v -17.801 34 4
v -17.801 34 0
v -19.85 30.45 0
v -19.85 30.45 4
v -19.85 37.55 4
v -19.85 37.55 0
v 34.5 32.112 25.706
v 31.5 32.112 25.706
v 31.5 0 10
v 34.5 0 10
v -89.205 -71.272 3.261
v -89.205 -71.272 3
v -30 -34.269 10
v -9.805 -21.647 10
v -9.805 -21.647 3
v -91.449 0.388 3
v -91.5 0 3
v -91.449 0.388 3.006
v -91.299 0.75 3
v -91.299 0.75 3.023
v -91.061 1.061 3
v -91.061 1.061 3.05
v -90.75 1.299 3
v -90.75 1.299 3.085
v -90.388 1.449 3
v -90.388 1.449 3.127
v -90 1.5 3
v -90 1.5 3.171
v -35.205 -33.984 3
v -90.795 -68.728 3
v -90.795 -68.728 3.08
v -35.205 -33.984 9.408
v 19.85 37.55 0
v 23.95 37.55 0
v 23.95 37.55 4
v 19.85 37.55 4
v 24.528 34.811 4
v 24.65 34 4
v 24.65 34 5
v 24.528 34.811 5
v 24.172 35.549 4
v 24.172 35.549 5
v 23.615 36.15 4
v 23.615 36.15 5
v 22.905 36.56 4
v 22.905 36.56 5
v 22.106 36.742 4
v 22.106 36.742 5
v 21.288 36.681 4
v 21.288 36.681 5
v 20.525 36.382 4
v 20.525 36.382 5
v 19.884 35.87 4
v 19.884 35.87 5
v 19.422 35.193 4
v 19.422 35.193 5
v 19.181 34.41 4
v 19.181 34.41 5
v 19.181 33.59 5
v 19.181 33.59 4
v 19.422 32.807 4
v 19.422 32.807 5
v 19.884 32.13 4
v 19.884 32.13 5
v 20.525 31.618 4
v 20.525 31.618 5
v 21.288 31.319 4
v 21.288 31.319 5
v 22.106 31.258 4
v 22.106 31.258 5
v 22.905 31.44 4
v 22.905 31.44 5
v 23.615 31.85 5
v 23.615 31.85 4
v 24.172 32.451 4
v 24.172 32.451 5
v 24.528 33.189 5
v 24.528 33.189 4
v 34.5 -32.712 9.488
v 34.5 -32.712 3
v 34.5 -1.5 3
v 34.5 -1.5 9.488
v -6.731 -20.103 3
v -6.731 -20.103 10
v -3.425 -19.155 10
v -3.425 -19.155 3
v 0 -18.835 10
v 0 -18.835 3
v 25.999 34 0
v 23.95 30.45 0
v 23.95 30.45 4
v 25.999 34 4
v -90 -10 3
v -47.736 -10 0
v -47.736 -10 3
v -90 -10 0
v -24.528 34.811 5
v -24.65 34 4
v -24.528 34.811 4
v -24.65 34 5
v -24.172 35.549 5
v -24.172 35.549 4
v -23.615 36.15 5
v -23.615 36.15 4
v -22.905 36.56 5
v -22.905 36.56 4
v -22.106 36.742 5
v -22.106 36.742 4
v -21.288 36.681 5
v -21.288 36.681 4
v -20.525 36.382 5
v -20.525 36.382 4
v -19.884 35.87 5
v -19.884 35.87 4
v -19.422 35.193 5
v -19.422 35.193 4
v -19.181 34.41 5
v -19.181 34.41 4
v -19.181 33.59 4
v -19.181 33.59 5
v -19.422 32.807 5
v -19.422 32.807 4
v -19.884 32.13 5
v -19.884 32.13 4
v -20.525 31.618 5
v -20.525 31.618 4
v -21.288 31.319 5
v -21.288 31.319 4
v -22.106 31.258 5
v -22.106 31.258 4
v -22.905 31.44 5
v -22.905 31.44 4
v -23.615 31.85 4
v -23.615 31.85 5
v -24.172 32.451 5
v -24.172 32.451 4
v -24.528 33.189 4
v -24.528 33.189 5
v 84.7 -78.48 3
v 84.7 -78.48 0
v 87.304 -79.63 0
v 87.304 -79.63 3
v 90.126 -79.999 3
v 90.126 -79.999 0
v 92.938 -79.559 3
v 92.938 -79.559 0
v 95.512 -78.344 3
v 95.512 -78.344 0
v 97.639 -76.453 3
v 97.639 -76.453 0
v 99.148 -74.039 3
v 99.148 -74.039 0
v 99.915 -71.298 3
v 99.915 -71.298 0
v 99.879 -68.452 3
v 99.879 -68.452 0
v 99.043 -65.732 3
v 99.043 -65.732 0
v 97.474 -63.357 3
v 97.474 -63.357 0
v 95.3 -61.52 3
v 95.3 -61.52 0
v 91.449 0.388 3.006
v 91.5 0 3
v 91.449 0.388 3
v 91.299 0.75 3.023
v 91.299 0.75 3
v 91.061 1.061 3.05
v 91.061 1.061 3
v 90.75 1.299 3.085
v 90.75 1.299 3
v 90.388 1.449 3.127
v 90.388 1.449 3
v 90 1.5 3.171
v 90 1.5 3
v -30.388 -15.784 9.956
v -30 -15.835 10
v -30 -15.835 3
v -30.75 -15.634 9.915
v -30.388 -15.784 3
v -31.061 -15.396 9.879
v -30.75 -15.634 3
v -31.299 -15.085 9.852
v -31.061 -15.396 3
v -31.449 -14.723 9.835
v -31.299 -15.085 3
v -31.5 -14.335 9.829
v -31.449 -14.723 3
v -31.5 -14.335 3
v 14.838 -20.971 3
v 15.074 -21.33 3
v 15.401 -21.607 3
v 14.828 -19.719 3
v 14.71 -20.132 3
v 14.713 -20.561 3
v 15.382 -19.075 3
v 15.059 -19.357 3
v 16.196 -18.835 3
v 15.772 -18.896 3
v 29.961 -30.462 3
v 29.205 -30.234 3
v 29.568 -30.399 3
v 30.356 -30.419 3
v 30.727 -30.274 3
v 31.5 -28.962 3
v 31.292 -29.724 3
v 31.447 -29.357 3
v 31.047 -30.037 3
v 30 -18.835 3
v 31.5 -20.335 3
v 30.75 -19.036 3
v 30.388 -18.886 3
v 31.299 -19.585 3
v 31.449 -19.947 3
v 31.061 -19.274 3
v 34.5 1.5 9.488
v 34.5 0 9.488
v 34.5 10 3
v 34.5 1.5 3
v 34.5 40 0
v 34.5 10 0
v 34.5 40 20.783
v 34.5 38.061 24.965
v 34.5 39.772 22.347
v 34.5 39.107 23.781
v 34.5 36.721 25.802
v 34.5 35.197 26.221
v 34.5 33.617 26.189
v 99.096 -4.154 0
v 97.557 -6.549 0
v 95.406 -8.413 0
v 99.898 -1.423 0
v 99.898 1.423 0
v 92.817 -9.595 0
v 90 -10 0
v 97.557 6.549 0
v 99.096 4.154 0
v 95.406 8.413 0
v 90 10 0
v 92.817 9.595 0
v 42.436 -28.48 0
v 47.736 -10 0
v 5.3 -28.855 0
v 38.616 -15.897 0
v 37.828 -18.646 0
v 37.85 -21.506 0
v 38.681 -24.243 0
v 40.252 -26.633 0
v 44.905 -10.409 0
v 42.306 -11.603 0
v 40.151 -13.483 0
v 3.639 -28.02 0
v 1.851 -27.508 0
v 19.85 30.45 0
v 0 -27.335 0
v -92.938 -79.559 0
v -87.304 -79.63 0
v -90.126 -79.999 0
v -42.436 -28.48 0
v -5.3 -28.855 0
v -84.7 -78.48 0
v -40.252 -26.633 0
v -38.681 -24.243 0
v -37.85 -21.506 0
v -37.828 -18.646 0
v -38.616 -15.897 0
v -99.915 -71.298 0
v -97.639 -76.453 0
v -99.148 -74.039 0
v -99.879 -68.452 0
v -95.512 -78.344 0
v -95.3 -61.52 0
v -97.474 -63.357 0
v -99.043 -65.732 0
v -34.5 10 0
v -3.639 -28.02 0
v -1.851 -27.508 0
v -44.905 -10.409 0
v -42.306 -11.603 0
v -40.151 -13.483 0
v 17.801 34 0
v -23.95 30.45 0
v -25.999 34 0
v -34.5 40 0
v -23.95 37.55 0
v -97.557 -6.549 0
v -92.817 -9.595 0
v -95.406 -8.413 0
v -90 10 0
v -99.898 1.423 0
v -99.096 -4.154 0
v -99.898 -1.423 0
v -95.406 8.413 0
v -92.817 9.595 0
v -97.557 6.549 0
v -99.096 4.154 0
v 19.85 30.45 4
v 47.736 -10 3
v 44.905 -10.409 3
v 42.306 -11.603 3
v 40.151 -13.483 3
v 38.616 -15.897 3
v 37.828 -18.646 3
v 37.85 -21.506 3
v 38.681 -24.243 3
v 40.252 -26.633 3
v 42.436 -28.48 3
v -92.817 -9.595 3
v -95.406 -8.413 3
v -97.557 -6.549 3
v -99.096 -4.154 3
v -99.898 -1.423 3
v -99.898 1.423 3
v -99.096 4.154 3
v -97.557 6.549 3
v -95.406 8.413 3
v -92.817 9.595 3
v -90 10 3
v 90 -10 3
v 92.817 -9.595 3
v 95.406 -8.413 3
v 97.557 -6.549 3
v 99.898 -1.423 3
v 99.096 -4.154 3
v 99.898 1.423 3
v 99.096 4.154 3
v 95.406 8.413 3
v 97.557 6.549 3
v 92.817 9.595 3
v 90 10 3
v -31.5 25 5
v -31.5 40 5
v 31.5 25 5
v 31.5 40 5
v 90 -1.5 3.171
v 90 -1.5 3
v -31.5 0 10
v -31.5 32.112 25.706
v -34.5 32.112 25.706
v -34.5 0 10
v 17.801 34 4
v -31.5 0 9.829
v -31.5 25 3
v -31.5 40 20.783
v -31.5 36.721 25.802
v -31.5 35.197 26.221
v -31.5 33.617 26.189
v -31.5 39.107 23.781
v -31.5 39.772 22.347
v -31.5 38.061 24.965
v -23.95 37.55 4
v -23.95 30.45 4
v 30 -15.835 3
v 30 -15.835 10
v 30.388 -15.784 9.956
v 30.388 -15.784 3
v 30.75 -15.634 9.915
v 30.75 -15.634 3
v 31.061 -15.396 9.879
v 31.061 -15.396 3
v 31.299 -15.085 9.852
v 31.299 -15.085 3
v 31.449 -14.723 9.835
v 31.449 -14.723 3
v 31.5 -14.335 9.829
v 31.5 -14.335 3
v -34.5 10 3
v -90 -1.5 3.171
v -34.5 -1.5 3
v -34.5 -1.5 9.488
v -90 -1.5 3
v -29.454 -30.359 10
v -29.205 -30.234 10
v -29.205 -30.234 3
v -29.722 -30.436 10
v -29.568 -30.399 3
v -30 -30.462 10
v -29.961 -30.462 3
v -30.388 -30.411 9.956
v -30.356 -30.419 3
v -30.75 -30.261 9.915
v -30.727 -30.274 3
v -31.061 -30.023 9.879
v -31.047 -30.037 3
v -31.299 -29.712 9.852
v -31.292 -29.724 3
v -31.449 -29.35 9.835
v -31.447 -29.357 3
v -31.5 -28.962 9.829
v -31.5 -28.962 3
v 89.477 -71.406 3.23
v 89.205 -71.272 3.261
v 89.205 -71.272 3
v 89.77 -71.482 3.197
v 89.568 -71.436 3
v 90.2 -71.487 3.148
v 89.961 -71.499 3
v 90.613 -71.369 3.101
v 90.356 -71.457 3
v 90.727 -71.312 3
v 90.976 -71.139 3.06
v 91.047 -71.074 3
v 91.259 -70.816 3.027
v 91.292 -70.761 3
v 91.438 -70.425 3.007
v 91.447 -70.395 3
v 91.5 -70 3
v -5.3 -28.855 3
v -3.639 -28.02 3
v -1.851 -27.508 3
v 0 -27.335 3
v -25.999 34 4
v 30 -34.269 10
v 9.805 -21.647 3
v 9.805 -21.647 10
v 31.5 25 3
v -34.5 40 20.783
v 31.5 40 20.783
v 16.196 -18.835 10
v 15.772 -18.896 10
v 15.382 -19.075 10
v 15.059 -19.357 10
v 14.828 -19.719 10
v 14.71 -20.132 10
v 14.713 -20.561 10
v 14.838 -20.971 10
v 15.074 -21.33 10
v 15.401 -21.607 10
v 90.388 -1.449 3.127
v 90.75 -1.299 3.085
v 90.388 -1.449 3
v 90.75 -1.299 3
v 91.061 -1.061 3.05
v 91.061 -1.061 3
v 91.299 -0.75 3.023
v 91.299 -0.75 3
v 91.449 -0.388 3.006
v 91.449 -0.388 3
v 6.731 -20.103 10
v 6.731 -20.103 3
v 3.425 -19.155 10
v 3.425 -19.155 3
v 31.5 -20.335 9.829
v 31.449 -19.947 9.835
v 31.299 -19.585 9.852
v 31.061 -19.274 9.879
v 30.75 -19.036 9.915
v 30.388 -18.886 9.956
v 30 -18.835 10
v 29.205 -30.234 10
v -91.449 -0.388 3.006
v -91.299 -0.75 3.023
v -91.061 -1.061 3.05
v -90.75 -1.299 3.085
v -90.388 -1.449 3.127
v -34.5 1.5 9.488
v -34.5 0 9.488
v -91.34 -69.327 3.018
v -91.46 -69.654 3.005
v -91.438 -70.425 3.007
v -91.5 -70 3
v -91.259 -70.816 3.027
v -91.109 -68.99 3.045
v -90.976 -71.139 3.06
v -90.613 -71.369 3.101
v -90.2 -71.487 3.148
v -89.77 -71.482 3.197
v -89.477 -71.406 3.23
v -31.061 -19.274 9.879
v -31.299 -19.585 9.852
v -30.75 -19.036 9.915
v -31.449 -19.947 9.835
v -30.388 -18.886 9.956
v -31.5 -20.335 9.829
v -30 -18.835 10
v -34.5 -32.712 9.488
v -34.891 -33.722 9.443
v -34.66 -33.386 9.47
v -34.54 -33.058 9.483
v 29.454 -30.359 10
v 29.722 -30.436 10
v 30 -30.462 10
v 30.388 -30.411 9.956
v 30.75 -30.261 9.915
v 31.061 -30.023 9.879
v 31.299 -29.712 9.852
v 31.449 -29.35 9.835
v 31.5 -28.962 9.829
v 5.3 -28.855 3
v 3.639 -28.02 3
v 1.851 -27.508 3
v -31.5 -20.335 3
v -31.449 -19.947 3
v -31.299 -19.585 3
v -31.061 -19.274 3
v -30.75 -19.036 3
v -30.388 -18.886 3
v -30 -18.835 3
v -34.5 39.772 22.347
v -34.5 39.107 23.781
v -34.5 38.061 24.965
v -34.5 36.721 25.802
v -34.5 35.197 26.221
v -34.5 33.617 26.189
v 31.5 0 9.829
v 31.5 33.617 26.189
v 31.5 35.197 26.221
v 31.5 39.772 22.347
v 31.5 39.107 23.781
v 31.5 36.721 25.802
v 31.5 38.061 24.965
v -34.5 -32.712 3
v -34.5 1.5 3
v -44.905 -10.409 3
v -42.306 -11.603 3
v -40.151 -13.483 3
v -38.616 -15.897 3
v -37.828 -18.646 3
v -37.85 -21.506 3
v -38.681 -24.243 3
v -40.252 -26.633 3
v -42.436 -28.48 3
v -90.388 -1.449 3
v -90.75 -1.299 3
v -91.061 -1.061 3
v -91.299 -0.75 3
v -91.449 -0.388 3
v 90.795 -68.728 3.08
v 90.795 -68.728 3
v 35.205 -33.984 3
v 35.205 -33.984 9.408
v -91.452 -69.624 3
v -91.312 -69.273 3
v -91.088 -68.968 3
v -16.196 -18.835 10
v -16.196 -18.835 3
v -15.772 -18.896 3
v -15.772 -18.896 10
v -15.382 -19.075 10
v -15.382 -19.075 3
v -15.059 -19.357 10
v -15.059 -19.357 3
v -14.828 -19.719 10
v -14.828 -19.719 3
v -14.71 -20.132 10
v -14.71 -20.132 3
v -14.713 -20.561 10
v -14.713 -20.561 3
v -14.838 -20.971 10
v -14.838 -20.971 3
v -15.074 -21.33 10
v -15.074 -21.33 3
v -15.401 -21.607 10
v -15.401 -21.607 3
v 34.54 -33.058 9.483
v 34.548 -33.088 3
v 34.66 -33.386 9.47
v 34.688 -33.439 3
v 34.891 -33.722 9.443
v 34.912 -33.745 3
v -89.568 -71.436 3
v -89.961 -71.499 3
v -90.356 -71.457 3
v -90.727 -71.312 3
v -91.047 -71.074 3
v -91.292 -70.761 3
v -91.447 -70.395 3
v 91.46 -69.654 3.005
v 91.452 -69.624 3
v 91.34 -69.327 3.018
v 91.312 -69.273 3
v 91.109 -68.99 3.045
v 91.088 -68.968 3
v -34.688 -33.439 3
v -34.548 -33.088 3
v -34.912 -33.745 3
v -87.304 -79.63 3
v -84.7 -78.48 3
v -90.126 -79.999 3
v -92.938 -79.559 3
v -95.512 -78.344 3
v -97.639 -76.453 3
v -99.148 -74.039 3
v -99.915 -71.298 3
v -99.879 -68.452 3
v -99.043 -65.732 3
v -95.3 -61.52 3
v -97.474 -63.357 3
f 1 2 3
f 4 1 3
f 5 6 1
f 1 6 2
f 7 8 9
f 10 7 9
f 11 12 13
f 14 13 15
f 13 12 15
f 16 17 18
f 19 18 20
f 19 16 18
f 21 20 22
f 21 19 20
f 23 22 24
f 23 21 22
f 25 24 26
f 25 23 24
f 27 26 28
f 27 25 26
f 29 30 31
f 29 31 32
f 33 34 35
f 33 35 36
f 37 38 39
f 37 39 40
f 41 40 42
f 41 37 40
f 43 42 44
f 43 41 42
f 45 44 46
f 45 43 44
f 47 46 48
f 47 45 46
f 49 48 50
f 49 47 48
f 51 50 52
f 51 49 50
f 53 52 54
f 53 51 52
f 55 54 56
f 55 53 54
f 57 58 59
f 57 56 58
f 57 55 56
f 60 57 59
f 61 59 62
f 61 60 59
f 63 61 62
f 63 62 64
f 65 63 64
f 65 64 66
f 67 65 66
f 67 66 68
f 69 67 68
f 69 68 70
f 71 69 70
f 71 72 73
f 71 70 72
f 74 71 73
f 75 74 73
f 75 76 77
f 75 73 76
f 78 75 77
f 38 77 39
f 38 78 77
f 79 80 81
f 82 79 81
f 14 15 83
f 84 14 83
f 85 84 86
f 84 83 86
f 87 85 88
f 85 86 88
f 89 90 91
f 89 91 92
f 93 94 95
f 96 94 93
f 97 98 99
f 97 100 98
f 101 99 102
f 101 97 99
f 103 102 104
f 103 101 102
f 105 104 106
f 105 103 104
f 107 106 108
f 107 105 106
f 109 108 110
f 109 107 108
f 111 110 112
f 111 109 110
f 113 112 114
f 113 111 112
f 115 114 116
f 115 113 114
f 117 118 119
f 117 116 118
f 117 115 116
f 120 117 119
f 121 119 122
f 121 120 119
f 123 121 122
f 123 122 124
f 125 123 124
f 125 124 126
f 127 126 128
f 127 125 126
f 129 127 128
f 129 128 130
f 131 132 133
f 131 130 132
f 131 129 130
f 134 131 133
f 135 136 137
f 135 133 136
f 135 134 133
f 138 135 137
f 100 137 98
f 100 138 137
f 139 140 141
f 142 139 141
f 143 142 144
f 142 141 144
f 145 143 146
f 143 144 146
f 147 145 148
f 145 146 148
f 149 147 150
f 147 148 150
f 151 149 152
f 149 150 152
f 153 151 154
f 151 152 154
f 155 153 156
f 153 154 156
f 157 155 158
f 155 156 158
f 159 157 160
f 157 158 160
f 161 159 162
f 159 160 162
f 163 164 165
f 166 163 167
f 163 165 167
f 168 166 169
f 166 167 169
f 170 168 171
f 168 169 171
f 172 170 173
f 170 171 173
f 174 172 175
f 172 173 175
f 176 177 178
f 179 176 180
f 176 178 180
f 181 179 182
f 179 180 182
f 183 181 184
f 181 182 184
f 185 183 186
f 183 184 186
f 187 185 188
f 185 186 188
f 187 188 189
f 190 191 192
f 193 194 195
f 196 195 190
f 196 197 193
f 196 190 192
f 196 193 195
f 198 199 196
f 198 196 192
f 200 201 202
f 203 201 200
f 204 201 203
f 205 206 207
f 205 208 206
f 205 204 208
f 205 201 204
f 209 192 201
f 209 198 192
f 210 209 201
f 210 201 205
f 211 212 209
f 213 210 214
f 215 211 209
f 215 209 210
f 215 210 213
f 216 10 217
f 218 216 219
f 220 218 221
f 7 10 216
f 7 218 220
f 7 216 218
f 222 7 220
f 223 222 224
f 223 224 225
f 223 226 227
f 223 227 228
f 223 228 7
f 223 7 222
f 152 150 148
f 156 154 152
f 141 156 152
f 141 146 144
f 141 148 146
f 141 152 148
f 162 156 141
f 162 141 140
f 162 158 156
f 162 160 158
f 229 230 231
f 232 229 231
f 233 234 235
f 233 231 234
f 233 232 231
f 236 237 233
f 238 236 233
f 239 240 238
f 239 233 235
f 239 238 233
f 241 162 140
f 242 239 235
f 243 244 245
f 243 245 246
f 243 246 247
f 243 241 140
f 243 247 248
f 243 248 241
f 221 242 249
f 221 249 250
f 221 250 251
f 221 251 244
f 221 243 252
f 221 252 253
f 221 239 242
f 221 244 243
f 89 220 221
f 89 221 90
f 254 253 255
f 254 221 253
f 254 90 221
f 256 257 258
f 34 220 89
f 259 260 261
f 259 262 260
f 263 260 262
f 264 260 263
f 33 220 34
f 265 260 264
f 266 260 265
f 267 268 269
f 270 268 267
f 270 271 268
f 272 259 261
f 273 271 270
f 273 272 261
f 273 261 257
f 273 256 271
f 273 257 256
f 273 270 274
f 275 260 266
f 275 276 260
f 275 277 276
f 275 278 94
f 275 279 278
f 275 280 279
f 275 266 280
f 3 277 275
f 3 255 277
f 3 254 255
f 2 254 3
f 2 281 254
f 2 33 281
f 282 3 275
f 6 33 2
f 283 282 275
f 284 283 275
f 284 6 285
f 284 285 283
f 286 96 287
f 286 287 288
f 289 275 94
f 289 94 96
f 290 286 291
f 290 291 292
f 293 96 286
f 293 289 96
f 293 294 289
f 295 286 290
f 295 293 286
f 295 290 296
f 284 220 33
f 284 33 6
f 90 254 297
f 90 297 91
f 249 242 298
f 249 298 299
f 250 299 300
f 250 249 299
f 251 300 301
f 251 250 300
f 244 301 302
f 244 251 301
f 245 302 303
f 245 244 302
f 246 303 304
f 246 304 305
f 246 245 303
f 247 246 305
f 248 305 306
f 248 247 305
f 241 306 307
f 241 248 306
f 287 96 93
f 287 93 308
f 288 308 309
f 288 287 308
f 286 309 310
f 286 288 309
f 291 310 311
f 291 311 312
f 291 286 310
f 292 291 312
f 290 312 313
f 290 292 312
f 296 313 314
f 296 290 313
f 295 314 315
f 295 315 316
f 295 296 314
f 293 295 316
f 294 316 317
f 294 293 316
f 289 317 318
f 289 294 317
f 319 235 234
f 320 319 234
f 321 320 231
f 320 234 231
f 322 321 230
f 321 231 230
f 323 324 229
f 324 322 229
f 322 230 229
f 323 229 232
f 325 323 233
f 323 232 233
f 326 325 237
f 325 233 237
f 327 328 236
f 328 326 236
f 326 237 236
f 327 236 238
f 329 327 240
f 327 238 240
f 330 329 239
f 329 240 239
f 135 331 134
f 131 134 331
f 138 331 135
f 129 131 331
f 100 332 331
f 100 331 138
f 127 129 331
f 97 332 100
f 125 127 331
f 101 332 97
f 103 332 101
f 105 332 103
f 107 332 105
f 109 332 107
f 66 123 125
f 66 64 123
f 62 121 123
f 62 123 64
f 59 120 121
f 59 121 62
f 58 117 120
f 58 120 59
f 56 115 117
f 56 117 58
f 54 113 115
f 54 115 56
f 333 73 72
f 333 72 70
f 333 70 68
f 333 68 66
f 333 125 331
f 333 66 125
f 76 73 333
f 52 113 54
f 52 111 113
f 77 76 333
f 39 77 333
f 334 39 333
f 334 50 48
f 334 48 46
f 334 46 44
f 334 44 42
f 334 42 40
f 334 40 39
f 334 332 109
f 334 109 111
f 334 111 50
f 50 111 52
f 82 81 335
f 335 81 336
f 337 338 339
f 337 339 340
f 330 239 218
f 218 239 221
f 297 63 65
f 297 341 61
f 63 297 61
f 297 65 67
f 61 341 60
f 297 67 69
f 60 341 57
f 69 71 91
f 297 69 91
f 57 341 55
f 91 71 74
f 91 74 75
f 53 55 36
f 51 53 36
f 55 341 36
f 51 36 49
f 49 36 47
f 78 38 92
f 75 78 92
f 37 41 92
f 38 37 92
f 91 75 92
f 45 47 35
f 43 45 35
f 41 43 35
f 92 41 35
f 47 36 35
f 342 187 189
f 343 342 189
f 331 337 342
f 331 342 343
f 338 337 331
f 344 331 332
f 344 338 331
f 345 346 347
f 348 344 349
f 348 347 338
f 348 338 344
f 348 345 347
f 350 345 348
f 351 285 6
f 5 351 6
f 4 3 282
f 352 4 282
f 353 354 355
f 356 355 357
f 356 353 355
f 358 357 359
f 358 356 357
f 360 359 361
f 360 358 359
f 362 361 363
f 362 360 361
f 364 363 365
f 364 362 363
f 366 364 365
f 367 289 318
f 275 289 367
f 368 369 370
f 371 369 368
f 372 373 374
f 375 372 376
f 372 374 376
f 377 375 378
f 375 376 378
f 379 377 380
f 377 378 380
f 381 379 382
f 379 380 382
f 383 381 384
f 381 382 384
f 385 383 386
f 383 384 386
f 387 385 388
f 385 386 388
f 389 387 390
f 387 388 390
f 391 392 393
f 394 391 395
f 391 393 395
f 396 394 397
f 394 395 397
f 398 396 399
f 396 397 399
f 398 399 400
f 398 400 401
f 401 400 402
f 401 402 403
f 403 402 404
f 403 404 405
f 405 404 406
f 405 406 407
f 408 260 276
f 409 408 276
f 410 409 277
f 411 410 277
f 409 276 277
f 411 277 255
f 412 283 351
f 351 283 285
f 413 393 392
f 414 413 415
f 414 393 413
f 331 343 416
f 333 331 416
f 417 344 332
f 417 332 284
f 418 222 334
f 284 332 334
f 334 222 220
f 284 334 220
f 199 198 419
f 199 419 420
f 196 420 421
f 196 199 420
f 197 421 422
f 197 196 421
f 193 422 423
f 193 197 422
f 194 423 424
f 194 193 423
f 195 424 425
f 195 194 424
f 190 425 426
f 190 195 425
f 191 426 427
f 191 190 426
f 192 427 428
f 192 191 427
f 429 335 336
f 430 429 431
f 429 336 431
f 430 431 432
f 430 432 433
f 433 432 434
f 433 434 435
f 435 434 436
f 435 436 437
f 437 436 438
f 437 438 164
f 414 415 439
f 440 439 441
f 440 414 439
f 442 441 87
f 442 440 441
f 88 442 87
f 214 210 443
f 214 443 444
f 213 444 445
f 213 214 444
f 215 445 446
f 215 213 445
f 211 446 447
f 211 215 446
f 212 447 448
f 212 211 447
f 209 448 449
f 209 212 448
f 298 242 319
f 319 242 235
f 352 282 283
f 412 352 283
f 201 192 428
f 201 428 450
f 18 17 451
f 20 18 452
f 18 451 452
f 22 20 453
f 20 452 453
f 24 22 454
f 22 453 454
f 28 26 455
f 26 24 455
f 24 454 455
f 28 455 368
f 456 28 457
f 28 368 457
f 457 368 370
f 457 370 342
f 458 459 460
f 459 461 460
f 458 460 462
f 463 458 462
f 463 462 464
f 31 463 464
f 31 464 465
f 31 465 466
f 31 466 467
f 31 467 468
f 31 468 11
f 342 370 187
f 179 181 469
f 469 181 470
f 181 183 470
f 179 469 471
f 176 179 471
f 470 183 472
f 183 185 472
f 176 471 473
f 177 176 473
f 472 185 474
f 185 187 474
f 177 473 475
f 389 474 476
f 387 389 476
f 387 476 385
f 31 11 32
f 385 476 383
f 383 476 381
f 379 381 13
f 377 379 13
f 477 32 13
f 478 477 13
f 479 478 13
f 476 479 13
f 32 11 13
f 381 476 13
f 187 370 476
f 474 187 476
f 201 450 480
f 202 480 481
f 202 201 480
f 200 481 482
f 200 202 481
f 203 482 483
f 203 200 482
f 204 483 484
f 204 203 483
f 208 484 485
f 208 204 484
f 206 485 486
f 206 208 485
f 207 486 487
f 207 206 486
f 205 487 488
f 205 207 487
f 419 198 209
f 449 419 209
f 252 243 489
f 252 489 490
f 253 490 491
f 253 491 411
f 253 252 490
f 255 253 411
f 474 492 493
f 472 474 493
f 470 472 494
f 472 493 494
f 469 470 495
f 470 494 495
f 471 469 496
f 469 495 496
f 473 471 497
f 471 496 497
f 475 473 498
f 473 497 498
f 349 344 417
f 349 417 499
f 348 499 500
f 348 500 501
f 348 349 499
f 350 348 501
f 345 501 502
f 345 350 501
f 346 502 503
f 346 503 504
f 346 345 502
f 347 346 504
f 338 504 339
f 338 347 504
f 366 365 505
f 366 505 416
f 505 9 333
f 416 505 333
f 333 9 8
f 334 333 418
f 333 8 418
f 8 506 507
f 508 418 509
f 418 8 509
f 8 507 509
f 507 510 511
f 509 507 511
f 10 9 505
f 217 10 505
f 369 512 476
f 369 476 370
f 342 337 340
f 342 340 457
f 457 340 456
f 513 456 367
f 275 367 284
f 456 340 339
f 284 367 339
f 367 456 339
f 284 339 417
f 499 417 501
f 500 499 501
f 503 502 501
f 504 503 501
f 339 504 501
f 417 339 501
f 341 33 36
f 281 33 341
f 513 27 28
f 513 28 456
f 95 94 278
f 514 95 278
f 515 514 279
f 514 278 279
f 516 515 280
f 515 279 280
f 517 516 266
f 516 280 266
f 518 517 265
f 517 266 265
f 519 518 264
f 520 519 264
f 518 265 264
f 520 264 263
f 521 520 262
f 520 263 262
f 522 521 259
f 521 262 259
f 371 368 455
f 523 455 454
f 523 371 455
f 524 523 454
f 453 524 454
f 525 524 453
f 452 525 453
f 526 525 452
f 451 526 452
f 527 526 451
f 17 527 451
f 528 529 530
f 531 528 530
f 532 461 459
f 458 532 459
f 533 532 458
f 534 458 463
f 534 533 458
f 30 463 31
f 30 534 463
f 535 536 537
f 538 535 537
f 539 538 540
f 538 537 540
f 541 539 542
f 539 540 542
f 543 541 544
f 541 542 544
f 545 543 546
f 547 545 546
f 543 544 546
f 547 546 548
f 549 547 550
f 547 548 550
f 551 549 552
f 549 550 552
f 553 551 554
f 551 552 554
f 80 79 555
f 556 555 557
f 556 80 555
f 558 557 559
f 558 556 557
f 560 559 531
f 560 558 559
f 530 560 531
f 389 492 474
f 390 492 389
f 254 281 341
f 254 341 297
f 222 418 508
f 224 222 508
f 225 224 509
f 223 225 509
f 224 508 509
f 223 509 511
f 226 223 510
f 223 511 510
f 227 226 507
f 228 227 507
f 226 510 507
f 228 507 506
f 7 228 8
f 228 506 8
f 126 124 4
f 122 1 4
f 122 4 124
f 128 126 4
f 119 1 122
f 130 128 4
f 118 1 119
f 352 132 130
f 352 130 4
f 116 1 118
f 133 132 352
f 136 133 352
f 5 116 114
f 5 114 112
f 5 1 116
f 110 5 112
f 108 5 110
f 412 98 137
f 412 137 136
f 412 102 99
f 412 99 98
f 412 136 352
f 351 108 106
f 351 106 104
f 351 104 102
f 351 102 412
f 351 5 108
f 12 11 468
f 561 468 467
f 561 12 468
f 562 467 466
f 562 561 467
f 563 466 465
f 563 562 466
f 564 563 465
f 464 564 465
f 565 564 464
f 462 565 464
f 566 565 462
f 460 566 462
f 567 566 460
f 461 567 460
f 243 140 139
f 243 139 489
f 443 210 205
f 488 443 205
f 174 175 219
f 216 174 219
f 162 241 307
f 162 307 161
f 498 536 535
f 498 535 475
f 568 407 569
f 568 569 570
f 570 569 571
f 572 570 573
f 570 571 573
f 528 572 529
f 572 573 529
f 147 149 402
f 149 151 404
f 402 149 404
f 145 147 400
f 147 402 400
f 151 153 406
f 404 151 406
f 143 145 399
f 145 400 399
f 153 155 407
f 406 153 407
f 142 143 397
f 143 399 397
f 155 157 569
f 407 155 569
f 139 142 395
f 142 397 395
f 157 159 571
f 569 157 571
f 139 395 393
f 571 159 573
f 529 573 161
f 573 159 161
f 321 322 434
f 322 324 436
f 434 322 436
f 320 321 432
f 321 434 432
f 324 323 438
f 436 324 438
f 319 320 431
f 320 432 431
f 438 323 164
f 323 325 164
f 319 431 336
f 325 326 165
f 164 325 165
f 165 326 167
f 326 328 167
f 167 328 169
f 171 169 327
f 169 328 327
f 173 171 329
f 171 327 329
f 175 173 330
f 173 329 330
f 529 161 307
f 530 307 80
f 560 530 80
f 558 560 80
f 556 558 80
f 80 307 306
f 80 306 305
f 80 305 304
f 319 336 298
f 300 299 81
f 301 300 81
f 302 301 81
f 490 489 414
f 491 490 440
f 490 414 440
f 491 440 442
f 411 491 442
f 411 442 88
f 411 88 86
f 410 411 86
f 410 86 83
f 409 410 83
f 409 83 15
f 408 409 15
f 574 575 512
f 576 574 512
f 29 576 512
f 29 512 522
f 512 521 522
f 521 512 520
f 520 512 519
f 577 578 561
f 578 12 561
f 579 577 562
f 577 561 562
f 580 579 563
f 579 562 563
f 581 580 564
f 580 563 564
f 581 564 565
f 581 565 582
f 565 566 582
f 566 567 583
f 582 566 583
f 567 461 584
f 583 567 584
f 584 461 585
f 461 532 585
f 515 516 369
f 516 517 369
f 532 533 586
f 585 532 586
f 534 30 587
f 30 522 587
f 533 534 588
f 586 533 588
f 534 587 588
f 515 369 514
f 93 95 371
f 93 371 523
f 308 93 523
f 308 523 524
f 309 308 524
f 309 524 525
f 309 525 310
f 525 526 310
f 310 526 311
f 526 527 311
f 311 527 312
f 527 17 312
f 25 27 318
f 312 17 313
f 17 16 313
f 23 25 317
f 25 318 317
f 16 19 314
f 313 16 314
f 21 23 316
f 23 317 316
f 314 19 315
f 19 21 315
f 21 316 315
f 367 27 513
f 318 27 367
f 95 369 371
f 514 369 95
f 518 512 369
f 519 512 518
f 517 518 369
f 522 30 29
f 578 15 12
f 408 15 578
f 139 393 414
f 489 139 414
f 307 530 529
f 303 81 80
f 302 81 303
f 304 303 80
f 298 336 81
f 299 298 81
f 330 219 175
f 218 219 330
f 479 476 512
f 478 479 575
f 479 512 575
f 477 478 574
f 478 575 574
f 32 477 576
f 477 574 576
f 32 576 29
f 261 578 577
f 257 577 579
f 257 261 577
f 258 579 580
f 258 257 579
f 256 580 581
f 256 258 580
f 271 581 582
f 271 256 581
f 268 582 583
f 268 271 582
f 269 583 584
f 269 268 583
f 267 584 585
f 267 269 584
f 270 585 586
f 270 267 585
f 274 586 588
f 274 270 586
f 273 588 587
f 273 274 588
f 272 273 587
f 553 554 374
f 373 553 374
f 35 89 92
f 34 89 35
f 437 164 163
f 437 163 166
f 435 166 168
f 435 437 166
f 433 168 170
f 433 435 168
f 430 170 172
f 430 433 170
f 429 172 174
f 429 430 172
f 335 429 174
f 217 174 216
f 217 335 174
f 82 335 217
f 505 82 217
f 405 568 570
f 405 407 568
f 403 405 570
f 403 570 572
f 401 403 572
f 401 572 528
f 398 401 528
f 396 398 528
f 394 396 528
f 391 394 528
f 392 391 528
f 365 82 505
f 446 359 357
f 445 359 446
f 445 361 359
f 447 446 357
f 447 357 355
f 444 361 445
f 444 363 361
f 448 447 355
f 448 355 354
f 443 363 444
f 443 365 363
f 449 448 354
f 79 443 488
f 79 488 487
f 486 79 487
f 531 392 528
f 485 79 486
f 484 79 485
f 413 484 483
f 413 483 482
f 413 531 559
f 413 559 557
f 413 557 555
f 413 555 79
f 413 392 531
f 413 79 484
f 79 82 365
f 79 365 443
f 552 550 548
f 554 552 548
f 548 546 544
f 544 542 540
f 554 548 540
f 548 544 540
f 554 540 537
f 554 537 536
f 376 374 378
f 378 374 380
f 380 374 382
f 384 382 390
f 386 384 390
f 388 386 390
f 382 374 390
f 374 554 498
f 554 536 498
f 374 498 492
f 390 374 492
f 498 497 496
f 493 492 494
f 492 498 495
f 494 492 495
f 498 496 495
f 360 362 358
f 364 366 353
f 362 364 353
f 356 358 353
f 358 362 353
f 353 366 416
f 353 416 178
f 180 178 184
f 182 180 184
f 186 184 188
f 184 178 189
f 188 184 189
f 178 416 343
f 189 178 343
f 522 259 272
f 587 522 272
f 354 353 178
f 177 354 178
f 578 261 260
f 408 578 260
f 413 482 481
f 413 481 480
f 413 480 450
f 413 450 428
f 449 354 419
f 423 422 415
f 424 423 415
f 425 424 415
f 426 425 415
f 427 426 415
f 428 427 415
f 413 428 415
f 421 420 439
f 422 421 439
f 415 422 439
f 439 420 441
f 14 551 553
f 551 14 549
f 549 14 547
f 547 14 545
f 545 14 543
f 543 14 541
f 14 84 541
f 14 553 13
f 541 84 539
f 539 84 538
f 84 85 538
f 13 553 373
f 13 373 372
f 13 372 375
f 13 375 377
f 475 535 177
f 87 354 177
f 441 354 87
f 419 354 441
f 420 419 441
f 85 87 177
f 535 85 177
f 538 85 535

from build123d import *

# Parameters (mm, degrees)
PAD_DEPTH            = 3
PAD001_DEPTH         = 10
SKETCH008_W          = 31.5
SKETCH008_H          = 15
PAD004_DEPTH         = 5
SKETCH009_R          = 2.75
POCKET002_DEPTH      = 313.05051685
POCKET002_DEPTH_BACK = 323.05051685
POCKET003_DEPTH      = 353.05051685
POCKET003_DEPTH_BACK = 393.05051685
POCKET004_DEPTH      = 4
PAD005_DEPTH         = 3


with BuildPart() as part:
    # Sketch → Pad (new body)
    with BuildSketch(Plane.XY):
        with BuildLine():
            ThreePointArc((89.9999996665, -10), (100, -1.98e-08), (89.9999997062, 10))
            Line((89.9999997062, 10), (31.5, 10))
            Line((31.5, 10), (31.5, 40))
            Line((31.5, 40), (0, 40))
            Line((0, 40), (0, 10))
            Line((0, 10), (0, -27.3349528301))
            ThreePointArc((5.3000111055, -28.854983356), (2.7568374325, -27.7224688967), (0, -27.3349528301))
            Line((84.6999795851, -78.4799636558), (5.3000111055, -28.854983356))
            ThreePointArc((84.6999795851, -78.4799636557), (98.4799840149, -75.2999878403), (95.2999552657, -61.5199956261))
            Line((42.4359754567, -28.4800082454), (95.2999552657, -61.5199956261))
            ThreePointArc((47.7359245737, -10), (38.1234305175, -17.2431977049), (42.4359754568, -28.4800082453))
            Line((47.7359245737, -10), (89.9999996665, -10))
        make_face()
    pad = extrude(amount=PAD_DEPTH)

    # Sketch001 → Pad001 (join)
    with BuildSketch(Plane.XY):
        with BuildLine():
            ThreePointArc((89.2050015192, -71.2719974118), (91.2719974827, -70.7949983672), (90.7949982537, -68.7280024463))
            Line((90.7949982537, -68.7280024463), (35.2050028881, -33.9842553428))
            ThreePointArc((34.5, -32.7122571332), (34.6880366632, -33.4394105688), (35.2050028881, -33.9842553428))
            Line((34.5, -32.7122571332), (34.5, -1.5))
            Line((34.5, -1.5), (89.9999999914, -1.5))
            ThreePointArc((89.9999999914, -1.5), (91.5, -1.09e-08), (90.0000000131, 1.5))
            Line((90.0000000131, 1.5), (34.5, 1.5))
            Line((34.5, 1.5), (34.5, 40))
            Line((34.5, 40), (31.5, 40))
            Line((31.5, 40), (31.5, -14.334953275))
            ThreePointArc((30.0000000301, -15.8349528301), (31.0606600252, -15.3956131485), (31.5, -14.334953275))
            Line((0, -15.8349528301), (30.0000000301, -15.8349528301))
            Line((0, -18.8349528301), (0, -15.8349528301))
            ThreePointArc((9.8049805408, -21.6469843002), (5.1001265767, -19.5518510506), (0, -18.8349528301))
            Line((89.2050015192, -71.2719974118), (9.8049805408, -21.6469843002))
        make_face()
        with BuildLine():
            Line((15.4013148944, -21.6069503467), (29.2050008044, -30.2342540405))
            ThreePointArc((29.2050008044, -30.2342540405), (30.727152292, -30.2742210781), (31.5, -28.9622573074))
            Line((31.5, -20.3349477146), (31.5, -28.9622573074))
            ThreePointArc((31.5, -20.3349477146), (31.0606583181, -19.2742908047), (29.9999998727, -18.8349528301))
            Line((16.1963133258, -18.8349528301), (29.9999998727, -18.8349528301))
            ThreePointArc((16.1963133258, -18.8349528301), (14.7544400888, -19.9214290586), (15.4013148944, -21.6069503467))
        make_face(mode=Mode.SUBTRACT)
    pad001 = extrude(amount=PAD001_DEPTH)

    # Sketch008 → Pad004 (join)
    with BuildSketch(Plane(origin=(0, 30, 0), x_dir=(1, 0, 0), z_dir=(0, 0, 1))):
        with Locations((15.75, 2.5)):
            Rectangle(SKETCH008_W, SKETCH008_H)
    pad004 = extrude(amount=PAD004_DEPTH)

    # Sketch009 → Pocket002 (cut, two sides)
    with BuildSketch(Plane(origin=(0, 30, 0), x_dir=(1, 0, 0), z_dir=(0, 0, 1))) as pocket002_sk:
        with Locations((21.9, 4)):
            Circle(SKETCH009_R)
    pocket002 = extrude(amount=-POCKET002_DEPTH, mode=Mode.SUBTRACT) + extrude(pocket002_sk.sketch, amount=POCKET002_DEPTH_BACK, mode=Mode.SUBTRACT)

    # Sketch010 → Pocket003 (cut, two sides)
    with BuildSketch(Plane.XZ) as pocket003_sk:
        Polygon((91.5, 3), (30, 10), (91.5, 10), align=None)
    pocket003 = extrude(amount=-POCKET003_DEPTH, mode=Mode.SUBTRACT) + extrude(pocket003_sk.sketch, amount=POCKET003_DEPTH_BACK, mode=Mode.SUBTRACT)

    # Sketch012 → Pocket004 (cut)
    with BuildSketch(Plane(origin=(0, 30, 0), x_dir=(1, 0, 0), z_dir=(0, 0, 1))):
        Polygon((23.9495934556, 7.55), (19.8504065444, 7.55), (17.8008130888, 4), (19.8504065444, 0.45), (23.9495934556, 0.45), (25.9991869112, 4), align=None)
    pocket004 = extrude(amount=POCKET004_DEPTH, mode=Mode.SUBTRACT)

    # Sketch013 → Pad005 (join)
    with BuildSketch(Plane.YZ.offset(31.5)):
        with BuildLine():
            ThreePointArc((40, 20.7833465364), (37.421342396, 25.4323336669), (32.1121450336, 25.706157964))
            Line((32.1121450336, 25.706157964), (0, 10))
            Line((0, 10), (0, 0))
            Line((0, 0), (40, 0))
            Line((40, 20.7833465364), (40, 0))
        make_face()
    pad005 = extrude(amount=PAD005_DEPTH)

    # Mirrored: Pad, Pad001, Pad004, Pocket002, Pocket003, Pocket004, Pad005 across Sketch V_Axis
    add(pad.mirror(Plane(origin=(0, 0, 0), x_dir=(0, 0, 1), z_dir=(1, 0, 0))))
    add(pad001.mirror(Plane(origin=(0, 0, 0), x_dir=(0, 0, 1), z_dir=(1, 0, 0))))
    add(pad004.mirror(Plane(origin=(0, 0, 0), x_dir=(0, 0, 1), z_dir=(1, 0, 0))))
    add(pocket002.mirror(Plane(origin=(0, 0, 0), x_dir=(0, 0, 1), z_dir=(1, 0, 0))), mode=Mode.SUBTRACT)
    add(pocket003.mirror(Plane(origin=(0, 0, 0), x_dir=(0, 0, 1), z_dir=(1, 0, 0))), mode=Mode.SUBTRACT)
    add(pocket004.mirror(Plane(origin=(0, 0, 0), x_dir=(0, 0, 1), z_dir=(1, 0, 0))), mode=Mode.SUBTRACT)
    add(pad005.mirror(Plane(origin=(0, 0, 0), x_dir=(0, 0, 1), z_dir=(1, 0, 0))))


solid = part.part
